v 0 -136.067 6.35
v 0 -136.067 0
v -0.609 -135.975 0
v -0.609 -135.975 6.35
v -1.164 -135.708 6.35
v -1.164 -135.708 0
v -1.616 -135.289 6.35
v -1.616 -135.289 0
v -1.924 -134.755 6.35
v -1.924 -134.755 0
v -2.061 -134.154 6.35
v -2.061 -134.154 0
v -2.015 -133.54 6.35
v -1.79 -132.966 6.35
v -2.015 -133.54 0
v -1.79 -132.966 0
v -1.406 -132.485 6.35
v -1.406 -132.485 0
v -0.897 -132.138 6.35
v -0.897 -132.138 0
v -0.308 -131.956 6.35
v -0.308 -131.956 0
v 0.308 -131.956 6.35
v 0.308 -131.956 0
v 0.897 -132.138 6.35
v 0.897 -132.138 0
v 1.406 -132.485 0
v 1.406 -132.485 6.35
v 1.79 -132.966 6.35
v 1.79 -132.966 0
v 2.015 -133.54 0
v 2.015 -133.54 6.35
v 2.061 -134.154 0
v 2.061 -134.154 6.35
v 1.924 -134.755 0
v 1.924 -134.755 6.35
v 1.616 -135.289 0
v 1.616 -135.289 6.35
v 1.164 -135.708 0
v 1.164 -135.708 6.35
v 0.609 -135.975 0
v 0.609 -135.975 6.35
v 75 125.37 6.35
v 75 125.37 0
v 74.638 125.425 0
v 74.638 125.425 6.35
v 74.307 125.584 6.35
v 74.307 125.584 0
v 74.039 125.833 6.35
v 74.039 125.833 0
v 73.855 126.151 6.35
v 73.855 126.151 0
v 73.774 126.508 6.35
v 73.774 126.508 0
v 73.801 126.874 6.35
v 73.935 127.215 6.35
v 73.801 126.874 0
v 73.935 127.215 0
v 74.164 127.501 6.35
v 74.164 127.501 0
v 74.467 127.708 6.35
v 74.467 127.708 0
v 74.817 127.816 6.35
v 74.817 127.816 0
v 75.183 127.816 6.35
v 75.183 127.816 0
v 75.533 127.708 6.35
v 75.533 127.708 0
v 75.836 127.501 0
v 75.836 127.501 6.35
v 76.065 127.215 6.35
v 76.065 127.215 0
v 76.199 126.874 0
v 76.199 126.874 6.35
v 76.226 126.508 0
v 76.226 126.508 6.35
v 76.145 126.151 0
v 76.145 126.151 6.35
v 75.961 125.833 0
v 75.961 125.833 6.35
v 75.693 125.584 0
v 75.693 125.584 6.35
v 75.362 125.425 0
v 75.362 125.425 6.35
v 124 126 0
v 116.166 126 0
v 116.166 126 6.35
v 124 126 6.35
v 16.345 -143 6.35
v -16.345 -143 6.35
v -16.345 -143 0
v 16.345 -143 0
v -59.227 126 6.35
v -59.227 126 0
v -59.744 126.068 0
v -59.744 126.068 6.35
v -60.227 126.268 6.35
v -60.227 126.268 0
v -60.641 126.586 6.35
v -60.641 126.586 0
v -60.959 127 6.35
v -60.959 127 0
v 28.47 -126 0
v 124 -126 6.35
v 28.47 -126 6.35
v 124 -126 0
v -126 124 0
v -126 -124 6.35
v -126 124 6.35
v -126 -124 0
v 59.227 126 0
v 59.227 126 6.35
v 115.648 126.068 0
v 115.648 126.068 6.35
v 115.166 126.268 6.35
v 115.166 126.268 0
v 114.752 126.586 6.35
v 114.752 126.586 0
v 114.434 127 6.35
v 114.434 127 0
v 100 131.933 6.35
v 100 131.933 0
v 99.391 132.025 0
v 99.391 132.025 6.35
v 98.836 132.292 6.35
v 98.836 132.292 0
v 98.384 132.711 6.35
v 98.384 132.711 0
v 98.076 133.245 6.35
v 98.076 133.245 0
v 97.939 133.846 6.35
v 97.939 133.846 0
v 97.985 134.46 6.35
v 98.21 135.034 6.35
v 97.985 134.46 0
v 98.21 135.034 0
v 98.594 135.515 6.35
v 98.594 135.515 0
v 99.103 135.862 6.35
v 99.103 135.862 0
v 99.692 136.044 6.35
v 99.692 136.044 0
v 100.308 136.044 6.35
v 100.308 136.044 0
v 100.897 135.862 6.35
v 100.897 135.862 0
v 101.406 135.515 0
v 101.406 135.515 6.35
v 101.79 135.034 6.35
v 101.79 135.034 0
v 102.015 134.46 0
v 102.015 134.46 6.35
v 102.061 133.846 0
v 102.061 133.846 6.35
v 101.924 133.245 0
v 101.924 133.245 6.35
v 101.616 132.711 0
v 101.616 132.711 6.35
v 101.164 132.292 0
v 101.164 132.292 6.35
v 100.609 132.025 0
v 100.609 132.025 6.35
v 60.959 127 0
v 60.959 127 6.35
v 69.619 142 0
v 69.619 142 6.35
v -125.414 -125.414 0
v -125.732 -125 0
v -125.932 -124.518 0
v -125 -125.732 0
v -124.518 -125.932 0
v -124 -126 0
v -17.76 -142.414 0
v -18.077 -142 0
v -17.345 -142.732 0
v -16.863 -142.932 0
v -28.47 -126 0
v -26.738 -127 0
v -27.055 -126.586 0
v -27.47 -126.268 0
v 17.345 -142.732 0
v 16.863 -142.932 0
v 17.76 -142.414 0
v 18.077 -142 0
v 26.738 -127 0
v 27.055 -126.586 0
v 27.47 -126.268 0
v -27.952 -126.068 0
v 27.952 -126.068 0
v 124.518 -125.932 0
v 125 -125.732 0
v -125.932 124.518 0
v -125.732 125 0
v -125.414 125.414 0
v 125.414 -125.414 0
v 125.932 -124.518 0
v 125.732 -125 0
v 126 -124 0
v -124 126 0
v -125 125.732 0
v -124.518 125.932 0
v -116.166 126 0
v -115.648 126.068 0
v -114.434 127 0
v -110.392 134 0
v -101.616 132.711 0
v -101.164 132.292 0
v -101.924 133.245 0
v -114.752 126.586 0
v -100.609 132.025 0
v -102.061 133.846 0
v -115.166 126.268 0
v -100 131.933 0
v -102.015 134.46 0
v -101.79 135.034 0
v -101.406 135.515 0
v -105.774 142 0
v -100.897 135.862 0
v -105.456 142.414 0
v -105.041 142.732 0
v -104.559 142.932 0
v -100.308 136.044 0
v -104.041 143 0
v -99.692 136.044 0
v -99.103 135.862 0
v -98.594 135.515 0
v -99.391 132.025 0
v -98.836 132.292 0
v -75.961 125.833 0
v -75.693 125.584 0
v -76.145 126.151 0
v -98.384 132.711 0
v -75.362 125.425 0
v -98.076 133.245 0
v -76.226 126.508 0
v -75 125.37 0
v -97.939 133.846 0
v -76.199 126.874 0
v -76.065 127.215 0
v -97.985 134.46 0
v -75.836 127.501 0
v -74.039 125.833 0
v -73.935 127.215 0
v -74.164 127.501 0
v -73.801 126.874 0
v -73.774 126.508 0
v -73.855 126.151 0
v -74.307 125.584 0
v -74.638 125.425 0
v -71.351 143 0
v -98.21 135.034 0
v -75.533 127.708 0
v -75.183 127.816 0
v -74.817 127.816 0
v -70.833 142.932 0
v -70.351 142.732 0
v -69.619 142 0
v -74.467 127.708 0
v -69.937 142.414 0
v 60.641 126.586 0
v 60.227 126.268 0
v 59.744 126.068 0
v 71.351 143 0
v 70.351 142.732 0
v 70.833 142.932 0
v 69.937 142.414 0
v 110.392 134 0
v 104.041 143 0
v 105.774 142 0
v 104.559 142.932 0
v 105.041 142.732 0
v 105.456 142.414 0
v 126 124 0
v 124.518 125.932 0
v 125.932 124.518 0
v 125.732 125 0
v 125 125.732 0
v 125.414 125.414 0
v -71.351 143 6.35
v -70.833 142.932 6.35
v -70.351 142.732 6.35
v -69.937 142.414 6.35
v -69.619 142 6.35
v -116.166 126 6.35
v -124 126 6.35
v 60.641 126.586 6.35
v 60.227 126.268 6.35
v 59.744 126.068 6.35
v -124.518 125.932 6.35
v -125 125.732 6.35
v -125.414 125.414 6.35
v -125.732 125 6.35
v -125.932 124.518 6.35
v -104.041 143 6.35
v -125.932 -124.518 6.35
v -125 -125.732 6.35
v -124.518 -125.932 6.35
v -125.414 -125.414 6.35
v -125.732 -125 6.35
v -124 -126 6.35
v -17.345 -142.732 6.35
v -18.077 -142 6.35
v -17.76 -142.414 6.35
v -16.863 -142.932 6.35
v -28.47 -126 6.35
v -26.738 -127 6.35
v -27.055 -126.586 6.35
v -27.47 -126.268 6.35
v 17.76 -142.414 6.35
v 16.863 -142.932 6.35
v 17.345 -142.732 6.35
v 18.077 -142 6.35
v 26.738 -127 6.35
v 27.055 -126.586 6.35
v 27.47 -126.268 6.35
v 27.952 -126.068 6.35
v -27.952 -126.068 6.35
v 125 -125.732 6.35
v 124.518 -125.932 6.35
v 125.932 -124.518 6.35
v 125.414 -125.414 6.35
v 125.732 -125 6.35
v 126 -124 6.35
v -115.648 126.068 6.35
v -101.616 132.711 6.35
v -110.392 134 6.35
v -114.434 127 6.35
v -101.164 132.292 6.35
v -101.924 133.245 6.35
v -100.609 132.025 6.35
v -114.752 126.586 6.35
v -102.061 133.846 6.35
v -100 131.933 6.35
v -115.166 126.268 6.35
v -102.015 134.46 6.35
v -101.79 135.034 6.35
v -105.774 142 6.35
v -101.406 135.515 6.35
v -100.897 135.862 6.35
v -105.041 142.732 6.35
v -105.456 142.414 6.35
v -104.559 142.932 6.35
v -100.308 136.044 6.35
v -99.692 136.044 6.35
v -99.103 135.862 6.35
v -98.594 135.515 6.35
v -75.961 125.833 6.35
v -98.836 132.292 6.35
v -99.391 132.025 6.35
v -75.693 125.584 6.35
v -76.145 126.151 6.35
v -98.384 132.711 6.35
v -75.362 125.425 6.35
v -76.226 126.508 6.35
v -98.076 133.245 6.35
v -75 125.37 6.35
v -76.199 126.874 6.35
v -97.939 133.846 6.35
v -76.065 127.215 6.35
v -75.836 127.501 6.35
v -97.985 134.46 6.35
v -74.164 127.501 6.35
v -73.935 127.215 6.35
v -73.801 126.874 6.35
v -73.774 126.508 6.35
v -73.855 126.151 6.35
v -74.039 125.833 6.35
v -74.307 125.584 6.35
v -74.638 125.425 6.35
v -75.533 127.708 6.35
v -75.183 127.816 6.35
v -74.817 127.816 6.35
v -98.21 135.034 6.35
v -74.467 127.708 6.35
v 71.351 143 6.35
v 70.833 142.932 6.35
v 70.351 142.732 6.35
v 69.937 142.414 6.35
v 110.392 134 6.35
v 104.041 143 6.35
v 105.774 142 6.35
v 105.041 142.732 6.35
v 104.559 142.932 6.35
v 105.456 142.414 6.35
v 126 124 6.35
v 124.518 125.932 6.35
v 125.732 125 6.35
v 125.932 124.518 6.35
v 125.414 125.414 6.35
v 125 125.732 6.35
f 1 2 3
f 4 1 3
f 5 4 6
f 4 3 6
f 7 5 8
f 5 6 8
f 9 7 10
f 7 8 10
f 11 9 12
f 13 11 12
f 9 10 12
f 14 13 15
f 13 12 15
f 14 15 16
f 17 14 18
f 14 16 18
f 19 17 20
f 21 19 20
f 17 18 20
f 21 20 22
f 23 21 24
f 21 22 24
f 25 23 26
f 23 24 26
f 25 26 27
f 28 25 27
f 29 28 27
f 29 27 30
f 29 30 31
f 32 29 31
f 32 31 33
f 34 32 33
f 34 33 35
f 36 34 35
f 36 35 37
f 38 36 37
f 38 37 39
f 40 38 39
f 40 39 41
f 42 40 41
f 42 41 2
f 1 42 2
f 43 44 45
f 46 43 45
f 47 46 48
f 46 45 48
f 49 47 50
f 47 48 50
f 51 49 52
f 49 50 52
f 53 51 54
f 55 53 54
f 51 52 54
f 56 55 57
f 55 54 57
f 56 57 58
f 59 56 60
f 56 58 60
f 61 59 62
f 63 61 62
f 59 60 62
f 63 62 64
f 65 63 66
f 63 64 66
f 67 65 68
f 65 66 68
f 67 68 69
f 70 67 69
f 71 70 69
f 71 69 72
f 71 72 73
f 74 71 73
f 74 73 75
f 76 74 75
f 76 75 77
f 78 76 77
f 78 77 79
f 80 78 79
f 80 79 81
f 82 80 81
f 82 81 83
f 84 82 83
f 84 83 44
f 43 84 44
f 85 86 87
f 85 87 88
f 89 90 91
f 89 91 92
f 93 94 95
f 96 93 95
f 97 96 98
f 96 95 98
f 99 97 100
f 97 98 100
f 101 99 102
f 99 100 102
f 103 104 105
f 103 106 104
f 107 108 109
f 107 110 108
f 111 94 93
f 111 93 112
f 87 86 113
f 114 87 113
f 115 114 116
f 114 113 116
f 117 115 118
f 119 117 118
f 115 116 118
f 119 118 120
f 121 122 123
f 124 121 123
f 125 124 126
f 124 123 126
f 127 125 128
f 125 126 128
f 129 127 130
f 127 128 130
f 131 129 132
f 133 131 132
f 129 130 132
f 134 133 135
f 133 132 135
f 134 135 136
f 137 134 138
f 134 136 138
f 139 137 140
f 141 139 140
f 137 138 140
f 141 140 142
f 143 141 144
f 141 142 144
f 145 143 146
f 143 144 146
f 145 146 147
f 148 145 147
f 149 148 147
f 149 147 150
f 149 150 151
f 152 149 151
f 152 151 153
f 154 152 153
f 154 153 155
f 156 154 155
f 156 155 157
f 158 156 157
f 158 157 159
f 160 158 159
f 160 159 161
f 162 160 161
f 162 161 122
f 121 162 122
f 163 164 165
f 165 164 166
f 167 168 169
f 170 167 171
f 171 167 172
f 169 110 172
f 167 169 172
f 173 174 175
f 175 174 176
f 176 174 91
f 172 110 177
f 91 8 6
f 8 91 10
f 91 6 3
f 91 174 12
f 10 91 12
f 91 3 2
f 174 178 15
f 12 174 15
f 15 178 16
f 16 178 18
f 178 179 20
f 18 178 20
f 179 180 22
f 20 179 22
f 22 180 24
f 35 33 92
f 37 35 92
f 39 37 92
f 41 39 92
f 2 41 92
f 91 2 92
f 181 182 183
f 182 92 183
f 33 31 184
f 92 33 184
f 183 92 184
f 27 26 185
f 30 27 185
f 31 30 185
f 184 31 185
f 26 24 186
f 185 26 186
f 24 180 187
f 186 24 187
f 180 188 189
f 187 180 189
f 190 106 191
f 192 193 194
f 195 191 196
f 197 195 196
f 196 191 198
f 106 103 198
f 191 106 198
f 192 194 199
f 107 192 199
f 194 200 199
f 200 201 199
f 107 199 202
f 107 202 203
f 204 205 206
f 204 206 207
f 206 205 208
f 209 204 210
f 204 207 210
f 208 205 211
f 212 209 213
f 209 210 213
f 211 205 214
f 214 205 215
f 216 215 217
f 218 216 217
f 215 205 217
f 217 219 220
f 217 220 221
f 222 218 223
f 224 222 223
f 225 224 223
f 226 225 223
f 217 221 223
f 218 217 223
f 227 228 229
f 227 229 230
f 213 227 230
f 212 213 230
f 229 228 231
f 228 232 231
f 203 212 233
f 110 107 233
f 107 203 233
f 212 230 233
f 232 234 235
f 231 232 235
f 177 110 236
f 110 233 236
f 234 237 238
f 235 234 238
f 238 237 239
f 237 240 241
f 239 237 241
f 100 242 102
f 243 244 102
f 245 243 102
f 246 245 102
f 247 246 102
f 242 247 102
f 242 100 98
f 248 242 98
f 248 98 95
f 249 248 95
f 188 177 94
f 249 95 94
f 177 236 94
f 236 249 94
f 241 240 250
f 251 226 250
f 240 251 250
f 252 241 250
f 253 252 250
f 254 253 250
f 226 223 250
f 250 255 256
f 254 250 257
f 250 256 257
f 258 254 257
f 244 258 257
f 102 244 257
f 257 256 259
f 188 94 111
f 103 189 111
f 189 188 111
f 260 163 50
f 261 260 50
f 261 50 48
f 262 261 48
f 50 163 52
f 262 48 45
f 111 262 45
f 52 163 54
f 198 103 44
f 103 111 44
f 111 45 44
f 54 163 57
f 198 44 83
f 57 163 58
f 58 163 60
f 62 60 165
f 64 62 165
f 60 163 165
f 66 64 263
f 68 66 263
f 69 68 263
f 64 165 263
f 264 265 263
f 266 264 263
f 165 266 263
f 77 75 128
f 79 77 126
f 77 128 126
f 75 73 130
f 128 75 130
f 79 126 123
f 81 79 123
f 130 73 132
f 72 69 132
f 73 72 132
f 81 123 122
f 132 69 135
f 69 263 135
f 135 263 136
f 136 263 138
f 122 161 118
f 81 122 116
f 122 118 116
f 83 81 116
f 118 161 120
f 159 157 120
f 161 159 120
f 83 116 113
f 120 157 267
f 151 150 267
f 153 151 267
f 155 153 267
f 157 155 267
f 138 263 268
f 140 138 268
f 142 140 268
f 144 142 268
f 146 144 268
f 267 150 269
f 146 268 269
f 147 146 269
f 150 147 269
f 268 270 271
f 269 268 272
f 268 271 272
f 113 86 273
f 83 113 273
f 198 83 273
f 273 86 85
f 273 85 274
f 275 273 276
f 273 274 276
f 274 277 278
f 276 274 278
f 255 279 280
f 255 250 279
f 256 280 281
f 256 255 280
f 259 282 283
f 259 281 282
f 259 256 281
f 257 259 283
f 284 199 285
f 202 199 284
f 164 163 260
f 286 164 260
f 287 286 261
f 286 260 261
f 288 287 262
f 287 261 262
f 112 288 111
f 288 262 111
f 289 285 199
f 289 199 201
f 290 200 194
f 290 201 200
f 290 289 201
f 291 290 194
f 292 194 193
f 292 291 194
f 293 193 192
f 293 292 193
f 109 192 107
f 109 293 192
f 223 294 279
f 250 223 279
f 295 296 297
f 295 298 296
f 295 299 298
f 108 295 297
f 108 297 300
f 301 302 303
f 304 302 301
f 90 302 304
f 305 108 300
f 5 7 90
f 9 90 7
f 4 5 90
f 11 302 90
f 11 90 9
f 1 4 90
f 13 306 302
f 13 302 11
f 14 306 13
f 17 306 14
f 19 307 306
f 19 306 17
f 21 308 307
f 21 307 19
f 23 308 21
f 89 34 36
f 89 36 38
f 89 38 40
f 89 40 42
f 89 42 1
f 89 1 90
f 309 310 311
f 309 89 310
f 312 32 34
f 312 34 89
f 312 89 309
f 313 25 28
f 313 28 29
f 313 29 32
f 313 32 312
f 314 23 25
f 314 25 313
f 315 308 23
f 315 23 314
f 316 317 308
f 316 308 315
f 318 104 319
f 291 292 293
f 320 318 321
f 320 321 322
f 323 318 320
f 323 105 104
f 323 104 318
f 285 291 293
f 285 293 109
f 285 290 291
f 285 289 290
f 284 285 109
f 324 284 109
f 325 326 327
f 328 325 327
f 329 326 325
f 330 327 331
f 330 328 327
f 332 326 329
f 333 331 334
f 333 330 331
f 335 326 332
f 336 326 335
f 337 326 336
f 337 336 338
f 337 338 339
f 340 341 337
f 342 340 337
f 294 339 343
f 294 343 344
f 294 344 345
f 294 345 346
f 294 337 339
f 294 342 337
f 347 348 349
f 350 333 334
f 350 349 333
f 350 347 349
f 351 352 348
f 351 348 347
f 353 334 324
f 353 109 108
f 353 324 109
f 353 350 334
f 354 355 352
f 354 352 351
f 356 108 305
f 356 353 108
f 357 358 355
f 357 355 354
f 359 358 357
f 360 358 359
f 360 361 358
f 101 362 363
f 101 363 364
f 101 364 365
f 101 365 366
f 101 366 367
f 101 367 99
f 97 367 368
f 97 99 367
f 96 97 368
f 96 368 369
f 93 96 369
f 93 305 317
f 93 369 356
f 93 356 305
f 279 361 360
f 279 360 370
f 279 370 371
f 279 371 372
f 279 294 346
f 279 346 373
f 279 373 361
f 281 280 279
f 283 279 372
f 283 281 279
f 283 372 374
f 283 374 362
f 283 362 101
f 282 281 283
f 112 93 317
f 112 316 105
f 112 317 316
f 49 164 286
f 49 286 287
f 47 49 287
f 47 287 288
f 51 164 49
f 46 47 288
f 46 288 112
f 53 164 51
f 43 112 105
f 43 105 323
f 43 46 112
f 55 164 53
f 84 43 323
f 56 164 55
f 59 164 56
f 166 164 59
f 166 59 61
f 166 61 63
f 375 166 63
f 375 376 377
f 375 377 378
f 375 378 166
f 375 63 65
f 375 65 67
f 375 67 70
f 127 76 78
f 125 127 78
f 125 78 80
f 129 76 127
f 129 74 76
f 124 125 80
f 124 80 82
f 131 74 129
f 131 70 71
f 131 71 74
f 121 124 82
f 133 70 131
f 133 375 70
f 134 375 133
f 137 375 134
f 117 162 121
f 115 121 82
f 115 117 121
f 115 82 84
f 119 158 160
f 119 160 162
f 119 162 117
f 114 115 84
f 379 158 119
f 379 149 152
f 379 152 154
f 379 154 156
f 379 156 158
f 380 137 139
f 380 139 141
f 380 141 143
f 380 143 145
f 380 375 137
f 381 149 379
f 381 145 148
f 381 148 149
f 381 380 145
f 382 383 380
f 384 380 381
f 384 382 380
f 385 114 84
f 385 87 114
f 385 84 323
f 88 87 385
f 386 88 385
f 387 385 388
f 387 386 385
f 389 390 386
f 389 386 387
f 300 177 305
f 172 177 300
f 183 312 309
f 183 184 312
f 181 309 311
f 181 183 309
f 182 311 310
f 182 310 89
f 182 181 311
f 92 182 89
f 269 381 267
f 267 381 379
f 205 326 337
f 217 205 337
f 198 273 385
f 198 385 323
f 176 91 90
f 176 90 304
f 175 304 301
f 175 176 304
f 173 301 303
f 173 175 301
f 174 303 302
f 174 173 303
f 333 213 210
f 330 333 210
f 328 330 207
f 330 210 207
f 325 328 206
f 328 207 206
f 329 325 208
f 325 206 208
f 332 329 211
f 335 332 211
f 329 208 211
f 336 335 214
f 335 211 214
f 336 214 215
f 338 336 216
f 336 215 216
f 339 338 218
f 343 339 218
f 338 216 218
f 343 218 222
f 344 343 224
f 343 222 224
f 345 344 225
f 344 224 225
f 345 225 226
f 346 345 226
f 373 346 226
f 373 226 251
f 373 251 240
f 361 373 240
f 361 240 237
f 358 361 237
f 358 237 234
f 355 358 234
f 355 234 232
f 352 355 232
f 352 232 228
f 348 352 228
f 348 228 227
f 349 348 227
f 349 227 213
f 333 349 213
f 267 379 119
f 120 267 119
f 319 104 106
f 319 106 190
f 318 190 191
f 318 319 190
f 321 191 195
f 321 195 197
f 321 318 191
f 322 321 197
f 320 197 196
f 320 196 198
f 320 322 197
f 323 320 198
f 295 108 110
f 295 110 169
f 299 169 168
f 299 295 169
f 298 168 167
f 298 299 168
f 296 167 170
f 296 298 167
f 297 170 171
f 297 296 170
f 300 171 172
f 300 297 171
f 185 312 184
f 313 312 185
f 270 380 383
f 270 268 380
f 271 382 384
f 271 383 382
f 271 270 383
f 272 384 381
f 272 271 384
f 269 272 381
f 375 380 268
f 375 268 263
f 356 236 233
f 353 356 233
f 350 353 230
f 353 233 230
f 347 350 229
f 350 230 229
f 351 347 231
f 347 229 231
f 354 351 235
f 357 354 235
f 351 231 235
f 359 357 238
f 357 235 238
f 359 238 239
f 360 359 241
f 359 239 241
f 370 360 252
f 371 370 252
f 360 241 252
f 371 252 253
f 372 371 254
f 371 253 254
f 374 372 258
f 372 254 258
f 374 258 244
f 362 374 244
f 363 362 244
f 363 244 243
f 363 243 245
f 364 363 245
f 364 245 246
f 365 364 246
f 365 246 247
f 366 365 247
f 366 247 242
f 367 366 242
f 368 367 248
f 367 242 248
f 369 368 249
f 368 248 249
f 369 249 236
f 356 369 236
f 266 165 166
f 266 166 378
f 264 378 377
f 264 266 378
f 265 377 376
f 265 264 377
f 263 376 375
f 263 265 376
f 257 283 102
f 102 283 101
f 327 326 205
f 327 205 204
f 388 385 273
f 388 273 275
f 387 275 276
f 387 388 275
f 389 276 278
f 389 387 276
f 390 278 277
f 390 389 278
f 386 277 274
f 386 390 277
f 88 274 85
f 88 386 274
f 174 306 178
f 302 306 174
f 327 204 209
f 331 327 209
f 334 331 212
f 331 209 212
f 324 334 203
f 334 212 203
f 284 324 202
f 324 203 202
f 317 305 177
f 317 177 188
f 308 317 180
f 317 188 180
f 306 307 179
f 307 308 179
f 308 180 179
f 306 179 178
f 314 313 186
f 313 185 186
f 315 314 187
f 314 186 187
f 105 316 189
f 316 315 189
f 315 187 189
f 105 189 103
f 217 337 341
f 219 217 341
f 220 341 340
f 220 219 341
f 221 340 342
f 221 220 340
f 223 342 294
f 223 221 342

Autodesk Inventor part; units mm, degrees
ref_plane "YZ Plane" through (0, 0, 0) normal (1, 0, 0) x (0, 1, 0)
ref_plane "XZ Plane" through (0, 0, 0) normal (0, 1, 0) x (-1, 0, 0)
ref_plane "XY Plane" through (0, 0, 0) normal (0, 0, 1) x (1, 0, 0)
sketch "Sketch1" plane through (0, 0, 0) normal (0, 0, 1) x (1, 0, 0)
  line L0 (126, -126) -> (-126, -126)
  line L1 (-126, -126) -> (-126, 126)
  line L2 (-126, 126) -> (126, 126)
  line L3 (126, 126) -> (126, -126)
  line L4 (126, -126) -> (-126, 126) construction
  line L5 (-126, -126) -> (126, 126) construction
  point P0 (0, 0)
  dimension "d0" = 252
  dimension "d1" = 252
extrude "Extrusion1" add sketch "Sketch1" along normal blind 6.35
sketch "Sketch2" plane through (0, 0, 6.35) normal (0, 0, 1) x (1, 0, 0)
  line L0 (-110.3923, 134) -> (-105.1962, 143)
  line L1 (-105.1962, 143) -> (-94.8038, 143)
  line L2 (-94.8038, 143) -> (-89.6077, 134)
  line L3 (-89.6077, 134) -> (-94.8038, 125)
  line L4 (-94.8038, 125) -> (-105.1962, 125)
  line L5 (-105.1962, 125) -> (-110.3923, 134)
  line L6 (94.8038, 143) -> (105.1962, 143)
  line L7 (105.1962, 143) -> (110.3923, 134)
  line L8 (110.3923, 134) -> (105.1962, 125)
  line L9 (105.1962, 125) -> (94.8038, 125)
  line L10 (94.8038, 125) -> (89.6077, 134)
  line L11 (89.6077, 134) -> (94.8038, 143)
  line L12 (-100, 134) -> (100, 134) construction
  line L13 (126, 126) -> (-126, 126) projected
  line L14 (-105.1962, 143) -> (-115.0111, 126)
  line L15 (105.1962, 143) -> (115.0111, 126)
  line L16 (94.8038, 143) -> (-94.8038, 143)
  line L17 (-126, -126) -> (126, -126) projected
  line L18 (-27.315, -126) -> (-17.5, -143)
  line L19 (-17.5, -143) -> (17.5, -143)
  line L20 (17.5, -143) -> (27.315, -126)
  line L21 (-70.1962, 143) -> (-60.3812, 126)
  line L22 (60.3812, 126) -> (70.1962, 143)
  point P0 (0, 0)
  point P1 (0, 134)
  point P2 (0, -143)
  point P3 (0, -134)
  dimension "d4" = 18
  dimension "d5" = 200
  dimension "d6" = 8
  dimension "d7" = 17
  dimension "d8" = 17
  dimension "d9" = 35
  dimension "d10" = 8
  dimension "d32" = 35
  dimension "d33" = 35
extrude "Extrusion2" add sketch "Sketch2" against normal up to surface (6.35 mm away) contours L0 L1 L2 L3 L13 L5 | L5 L13 L14 | L16 L21 L13 L3 L2 | L16 L11 L10 L13 L22 | L6 L7 L8 L13 L10 L11 | L8 L15 L13 | L17 L20 L19 L18
hole "Hole1" at (0, -134, 6.35) at (-100, 134, 6.35) at (100, 134, 6.35) direction (0, 0, -1) diameter 4.134 end through all thread size "M5x0.8" class "6H" standard "ANSI Metric M Profile"
fillet "Fillet1" radius 2 16 edges at (17.5, -143, 3.175) (27.315, -126, 3.175) (126, -126, 3.175) (-126, 126, 3.175) (115.0111, 126, 3.175) (105.1962, 143, 3.175) (126, 126, 3.175) (-27.315, -126, 3.175) (-17.5, -143, 3.175) (-126, -126, 3.175) (-115.0111, 126, 3.175) (-105.1962, 143, 3.175) (-70.1962, 143, 3.175) (-60.3812, 126, 3.175) (60.3812, 126, 3.175) (70.1962, 143, 3.175)
sketch "Sketch3" plane through (0, 0, 6.35) normal (0, 0, 1) x (1, 0, 0)
  line L0 (150, -125) -> (-150, -125) construction
  line L1 (-150, -125) -> (-150, 125) construction
  line L2 (-150, 125) -> (150, 125) construction
  line L3 (150, 125) -> (150, -125) construction
  line L4 (150, -125) -> (-150, 125) construction
  line L5 (-150, -125) -> (150, 125) construction
  circle A0 centre (-75, 126.6) radius 1.6 construction
  line L6 (-75, 126.6) -> (75, 126.6) construction
  circle A1 centre (75, 126.6) radius 1.6 construction
  point P0 (0, 0)
  point P1 (0, 126.6)
  dimension "d21" = 300
  dimension "d22" = 250
  dimension "d23" = 3.2
  dimension "d24" = 150
hole "Hole2" at (-75, 126.6, 6.35) at (75, 126.6, 6.35) direction (0, 0, -1) diameter 2.459 end through all thread size "M3x0.5" class "6H" standard "ANSI Metric M Profile"
equation "\"d7\" = d8"
equation "\"d10\" = d6"
equation "\"d32\" = d9"
equation "\"d33\" = d32"
properties part number "Print Bed" material "Aluminum 6061"
